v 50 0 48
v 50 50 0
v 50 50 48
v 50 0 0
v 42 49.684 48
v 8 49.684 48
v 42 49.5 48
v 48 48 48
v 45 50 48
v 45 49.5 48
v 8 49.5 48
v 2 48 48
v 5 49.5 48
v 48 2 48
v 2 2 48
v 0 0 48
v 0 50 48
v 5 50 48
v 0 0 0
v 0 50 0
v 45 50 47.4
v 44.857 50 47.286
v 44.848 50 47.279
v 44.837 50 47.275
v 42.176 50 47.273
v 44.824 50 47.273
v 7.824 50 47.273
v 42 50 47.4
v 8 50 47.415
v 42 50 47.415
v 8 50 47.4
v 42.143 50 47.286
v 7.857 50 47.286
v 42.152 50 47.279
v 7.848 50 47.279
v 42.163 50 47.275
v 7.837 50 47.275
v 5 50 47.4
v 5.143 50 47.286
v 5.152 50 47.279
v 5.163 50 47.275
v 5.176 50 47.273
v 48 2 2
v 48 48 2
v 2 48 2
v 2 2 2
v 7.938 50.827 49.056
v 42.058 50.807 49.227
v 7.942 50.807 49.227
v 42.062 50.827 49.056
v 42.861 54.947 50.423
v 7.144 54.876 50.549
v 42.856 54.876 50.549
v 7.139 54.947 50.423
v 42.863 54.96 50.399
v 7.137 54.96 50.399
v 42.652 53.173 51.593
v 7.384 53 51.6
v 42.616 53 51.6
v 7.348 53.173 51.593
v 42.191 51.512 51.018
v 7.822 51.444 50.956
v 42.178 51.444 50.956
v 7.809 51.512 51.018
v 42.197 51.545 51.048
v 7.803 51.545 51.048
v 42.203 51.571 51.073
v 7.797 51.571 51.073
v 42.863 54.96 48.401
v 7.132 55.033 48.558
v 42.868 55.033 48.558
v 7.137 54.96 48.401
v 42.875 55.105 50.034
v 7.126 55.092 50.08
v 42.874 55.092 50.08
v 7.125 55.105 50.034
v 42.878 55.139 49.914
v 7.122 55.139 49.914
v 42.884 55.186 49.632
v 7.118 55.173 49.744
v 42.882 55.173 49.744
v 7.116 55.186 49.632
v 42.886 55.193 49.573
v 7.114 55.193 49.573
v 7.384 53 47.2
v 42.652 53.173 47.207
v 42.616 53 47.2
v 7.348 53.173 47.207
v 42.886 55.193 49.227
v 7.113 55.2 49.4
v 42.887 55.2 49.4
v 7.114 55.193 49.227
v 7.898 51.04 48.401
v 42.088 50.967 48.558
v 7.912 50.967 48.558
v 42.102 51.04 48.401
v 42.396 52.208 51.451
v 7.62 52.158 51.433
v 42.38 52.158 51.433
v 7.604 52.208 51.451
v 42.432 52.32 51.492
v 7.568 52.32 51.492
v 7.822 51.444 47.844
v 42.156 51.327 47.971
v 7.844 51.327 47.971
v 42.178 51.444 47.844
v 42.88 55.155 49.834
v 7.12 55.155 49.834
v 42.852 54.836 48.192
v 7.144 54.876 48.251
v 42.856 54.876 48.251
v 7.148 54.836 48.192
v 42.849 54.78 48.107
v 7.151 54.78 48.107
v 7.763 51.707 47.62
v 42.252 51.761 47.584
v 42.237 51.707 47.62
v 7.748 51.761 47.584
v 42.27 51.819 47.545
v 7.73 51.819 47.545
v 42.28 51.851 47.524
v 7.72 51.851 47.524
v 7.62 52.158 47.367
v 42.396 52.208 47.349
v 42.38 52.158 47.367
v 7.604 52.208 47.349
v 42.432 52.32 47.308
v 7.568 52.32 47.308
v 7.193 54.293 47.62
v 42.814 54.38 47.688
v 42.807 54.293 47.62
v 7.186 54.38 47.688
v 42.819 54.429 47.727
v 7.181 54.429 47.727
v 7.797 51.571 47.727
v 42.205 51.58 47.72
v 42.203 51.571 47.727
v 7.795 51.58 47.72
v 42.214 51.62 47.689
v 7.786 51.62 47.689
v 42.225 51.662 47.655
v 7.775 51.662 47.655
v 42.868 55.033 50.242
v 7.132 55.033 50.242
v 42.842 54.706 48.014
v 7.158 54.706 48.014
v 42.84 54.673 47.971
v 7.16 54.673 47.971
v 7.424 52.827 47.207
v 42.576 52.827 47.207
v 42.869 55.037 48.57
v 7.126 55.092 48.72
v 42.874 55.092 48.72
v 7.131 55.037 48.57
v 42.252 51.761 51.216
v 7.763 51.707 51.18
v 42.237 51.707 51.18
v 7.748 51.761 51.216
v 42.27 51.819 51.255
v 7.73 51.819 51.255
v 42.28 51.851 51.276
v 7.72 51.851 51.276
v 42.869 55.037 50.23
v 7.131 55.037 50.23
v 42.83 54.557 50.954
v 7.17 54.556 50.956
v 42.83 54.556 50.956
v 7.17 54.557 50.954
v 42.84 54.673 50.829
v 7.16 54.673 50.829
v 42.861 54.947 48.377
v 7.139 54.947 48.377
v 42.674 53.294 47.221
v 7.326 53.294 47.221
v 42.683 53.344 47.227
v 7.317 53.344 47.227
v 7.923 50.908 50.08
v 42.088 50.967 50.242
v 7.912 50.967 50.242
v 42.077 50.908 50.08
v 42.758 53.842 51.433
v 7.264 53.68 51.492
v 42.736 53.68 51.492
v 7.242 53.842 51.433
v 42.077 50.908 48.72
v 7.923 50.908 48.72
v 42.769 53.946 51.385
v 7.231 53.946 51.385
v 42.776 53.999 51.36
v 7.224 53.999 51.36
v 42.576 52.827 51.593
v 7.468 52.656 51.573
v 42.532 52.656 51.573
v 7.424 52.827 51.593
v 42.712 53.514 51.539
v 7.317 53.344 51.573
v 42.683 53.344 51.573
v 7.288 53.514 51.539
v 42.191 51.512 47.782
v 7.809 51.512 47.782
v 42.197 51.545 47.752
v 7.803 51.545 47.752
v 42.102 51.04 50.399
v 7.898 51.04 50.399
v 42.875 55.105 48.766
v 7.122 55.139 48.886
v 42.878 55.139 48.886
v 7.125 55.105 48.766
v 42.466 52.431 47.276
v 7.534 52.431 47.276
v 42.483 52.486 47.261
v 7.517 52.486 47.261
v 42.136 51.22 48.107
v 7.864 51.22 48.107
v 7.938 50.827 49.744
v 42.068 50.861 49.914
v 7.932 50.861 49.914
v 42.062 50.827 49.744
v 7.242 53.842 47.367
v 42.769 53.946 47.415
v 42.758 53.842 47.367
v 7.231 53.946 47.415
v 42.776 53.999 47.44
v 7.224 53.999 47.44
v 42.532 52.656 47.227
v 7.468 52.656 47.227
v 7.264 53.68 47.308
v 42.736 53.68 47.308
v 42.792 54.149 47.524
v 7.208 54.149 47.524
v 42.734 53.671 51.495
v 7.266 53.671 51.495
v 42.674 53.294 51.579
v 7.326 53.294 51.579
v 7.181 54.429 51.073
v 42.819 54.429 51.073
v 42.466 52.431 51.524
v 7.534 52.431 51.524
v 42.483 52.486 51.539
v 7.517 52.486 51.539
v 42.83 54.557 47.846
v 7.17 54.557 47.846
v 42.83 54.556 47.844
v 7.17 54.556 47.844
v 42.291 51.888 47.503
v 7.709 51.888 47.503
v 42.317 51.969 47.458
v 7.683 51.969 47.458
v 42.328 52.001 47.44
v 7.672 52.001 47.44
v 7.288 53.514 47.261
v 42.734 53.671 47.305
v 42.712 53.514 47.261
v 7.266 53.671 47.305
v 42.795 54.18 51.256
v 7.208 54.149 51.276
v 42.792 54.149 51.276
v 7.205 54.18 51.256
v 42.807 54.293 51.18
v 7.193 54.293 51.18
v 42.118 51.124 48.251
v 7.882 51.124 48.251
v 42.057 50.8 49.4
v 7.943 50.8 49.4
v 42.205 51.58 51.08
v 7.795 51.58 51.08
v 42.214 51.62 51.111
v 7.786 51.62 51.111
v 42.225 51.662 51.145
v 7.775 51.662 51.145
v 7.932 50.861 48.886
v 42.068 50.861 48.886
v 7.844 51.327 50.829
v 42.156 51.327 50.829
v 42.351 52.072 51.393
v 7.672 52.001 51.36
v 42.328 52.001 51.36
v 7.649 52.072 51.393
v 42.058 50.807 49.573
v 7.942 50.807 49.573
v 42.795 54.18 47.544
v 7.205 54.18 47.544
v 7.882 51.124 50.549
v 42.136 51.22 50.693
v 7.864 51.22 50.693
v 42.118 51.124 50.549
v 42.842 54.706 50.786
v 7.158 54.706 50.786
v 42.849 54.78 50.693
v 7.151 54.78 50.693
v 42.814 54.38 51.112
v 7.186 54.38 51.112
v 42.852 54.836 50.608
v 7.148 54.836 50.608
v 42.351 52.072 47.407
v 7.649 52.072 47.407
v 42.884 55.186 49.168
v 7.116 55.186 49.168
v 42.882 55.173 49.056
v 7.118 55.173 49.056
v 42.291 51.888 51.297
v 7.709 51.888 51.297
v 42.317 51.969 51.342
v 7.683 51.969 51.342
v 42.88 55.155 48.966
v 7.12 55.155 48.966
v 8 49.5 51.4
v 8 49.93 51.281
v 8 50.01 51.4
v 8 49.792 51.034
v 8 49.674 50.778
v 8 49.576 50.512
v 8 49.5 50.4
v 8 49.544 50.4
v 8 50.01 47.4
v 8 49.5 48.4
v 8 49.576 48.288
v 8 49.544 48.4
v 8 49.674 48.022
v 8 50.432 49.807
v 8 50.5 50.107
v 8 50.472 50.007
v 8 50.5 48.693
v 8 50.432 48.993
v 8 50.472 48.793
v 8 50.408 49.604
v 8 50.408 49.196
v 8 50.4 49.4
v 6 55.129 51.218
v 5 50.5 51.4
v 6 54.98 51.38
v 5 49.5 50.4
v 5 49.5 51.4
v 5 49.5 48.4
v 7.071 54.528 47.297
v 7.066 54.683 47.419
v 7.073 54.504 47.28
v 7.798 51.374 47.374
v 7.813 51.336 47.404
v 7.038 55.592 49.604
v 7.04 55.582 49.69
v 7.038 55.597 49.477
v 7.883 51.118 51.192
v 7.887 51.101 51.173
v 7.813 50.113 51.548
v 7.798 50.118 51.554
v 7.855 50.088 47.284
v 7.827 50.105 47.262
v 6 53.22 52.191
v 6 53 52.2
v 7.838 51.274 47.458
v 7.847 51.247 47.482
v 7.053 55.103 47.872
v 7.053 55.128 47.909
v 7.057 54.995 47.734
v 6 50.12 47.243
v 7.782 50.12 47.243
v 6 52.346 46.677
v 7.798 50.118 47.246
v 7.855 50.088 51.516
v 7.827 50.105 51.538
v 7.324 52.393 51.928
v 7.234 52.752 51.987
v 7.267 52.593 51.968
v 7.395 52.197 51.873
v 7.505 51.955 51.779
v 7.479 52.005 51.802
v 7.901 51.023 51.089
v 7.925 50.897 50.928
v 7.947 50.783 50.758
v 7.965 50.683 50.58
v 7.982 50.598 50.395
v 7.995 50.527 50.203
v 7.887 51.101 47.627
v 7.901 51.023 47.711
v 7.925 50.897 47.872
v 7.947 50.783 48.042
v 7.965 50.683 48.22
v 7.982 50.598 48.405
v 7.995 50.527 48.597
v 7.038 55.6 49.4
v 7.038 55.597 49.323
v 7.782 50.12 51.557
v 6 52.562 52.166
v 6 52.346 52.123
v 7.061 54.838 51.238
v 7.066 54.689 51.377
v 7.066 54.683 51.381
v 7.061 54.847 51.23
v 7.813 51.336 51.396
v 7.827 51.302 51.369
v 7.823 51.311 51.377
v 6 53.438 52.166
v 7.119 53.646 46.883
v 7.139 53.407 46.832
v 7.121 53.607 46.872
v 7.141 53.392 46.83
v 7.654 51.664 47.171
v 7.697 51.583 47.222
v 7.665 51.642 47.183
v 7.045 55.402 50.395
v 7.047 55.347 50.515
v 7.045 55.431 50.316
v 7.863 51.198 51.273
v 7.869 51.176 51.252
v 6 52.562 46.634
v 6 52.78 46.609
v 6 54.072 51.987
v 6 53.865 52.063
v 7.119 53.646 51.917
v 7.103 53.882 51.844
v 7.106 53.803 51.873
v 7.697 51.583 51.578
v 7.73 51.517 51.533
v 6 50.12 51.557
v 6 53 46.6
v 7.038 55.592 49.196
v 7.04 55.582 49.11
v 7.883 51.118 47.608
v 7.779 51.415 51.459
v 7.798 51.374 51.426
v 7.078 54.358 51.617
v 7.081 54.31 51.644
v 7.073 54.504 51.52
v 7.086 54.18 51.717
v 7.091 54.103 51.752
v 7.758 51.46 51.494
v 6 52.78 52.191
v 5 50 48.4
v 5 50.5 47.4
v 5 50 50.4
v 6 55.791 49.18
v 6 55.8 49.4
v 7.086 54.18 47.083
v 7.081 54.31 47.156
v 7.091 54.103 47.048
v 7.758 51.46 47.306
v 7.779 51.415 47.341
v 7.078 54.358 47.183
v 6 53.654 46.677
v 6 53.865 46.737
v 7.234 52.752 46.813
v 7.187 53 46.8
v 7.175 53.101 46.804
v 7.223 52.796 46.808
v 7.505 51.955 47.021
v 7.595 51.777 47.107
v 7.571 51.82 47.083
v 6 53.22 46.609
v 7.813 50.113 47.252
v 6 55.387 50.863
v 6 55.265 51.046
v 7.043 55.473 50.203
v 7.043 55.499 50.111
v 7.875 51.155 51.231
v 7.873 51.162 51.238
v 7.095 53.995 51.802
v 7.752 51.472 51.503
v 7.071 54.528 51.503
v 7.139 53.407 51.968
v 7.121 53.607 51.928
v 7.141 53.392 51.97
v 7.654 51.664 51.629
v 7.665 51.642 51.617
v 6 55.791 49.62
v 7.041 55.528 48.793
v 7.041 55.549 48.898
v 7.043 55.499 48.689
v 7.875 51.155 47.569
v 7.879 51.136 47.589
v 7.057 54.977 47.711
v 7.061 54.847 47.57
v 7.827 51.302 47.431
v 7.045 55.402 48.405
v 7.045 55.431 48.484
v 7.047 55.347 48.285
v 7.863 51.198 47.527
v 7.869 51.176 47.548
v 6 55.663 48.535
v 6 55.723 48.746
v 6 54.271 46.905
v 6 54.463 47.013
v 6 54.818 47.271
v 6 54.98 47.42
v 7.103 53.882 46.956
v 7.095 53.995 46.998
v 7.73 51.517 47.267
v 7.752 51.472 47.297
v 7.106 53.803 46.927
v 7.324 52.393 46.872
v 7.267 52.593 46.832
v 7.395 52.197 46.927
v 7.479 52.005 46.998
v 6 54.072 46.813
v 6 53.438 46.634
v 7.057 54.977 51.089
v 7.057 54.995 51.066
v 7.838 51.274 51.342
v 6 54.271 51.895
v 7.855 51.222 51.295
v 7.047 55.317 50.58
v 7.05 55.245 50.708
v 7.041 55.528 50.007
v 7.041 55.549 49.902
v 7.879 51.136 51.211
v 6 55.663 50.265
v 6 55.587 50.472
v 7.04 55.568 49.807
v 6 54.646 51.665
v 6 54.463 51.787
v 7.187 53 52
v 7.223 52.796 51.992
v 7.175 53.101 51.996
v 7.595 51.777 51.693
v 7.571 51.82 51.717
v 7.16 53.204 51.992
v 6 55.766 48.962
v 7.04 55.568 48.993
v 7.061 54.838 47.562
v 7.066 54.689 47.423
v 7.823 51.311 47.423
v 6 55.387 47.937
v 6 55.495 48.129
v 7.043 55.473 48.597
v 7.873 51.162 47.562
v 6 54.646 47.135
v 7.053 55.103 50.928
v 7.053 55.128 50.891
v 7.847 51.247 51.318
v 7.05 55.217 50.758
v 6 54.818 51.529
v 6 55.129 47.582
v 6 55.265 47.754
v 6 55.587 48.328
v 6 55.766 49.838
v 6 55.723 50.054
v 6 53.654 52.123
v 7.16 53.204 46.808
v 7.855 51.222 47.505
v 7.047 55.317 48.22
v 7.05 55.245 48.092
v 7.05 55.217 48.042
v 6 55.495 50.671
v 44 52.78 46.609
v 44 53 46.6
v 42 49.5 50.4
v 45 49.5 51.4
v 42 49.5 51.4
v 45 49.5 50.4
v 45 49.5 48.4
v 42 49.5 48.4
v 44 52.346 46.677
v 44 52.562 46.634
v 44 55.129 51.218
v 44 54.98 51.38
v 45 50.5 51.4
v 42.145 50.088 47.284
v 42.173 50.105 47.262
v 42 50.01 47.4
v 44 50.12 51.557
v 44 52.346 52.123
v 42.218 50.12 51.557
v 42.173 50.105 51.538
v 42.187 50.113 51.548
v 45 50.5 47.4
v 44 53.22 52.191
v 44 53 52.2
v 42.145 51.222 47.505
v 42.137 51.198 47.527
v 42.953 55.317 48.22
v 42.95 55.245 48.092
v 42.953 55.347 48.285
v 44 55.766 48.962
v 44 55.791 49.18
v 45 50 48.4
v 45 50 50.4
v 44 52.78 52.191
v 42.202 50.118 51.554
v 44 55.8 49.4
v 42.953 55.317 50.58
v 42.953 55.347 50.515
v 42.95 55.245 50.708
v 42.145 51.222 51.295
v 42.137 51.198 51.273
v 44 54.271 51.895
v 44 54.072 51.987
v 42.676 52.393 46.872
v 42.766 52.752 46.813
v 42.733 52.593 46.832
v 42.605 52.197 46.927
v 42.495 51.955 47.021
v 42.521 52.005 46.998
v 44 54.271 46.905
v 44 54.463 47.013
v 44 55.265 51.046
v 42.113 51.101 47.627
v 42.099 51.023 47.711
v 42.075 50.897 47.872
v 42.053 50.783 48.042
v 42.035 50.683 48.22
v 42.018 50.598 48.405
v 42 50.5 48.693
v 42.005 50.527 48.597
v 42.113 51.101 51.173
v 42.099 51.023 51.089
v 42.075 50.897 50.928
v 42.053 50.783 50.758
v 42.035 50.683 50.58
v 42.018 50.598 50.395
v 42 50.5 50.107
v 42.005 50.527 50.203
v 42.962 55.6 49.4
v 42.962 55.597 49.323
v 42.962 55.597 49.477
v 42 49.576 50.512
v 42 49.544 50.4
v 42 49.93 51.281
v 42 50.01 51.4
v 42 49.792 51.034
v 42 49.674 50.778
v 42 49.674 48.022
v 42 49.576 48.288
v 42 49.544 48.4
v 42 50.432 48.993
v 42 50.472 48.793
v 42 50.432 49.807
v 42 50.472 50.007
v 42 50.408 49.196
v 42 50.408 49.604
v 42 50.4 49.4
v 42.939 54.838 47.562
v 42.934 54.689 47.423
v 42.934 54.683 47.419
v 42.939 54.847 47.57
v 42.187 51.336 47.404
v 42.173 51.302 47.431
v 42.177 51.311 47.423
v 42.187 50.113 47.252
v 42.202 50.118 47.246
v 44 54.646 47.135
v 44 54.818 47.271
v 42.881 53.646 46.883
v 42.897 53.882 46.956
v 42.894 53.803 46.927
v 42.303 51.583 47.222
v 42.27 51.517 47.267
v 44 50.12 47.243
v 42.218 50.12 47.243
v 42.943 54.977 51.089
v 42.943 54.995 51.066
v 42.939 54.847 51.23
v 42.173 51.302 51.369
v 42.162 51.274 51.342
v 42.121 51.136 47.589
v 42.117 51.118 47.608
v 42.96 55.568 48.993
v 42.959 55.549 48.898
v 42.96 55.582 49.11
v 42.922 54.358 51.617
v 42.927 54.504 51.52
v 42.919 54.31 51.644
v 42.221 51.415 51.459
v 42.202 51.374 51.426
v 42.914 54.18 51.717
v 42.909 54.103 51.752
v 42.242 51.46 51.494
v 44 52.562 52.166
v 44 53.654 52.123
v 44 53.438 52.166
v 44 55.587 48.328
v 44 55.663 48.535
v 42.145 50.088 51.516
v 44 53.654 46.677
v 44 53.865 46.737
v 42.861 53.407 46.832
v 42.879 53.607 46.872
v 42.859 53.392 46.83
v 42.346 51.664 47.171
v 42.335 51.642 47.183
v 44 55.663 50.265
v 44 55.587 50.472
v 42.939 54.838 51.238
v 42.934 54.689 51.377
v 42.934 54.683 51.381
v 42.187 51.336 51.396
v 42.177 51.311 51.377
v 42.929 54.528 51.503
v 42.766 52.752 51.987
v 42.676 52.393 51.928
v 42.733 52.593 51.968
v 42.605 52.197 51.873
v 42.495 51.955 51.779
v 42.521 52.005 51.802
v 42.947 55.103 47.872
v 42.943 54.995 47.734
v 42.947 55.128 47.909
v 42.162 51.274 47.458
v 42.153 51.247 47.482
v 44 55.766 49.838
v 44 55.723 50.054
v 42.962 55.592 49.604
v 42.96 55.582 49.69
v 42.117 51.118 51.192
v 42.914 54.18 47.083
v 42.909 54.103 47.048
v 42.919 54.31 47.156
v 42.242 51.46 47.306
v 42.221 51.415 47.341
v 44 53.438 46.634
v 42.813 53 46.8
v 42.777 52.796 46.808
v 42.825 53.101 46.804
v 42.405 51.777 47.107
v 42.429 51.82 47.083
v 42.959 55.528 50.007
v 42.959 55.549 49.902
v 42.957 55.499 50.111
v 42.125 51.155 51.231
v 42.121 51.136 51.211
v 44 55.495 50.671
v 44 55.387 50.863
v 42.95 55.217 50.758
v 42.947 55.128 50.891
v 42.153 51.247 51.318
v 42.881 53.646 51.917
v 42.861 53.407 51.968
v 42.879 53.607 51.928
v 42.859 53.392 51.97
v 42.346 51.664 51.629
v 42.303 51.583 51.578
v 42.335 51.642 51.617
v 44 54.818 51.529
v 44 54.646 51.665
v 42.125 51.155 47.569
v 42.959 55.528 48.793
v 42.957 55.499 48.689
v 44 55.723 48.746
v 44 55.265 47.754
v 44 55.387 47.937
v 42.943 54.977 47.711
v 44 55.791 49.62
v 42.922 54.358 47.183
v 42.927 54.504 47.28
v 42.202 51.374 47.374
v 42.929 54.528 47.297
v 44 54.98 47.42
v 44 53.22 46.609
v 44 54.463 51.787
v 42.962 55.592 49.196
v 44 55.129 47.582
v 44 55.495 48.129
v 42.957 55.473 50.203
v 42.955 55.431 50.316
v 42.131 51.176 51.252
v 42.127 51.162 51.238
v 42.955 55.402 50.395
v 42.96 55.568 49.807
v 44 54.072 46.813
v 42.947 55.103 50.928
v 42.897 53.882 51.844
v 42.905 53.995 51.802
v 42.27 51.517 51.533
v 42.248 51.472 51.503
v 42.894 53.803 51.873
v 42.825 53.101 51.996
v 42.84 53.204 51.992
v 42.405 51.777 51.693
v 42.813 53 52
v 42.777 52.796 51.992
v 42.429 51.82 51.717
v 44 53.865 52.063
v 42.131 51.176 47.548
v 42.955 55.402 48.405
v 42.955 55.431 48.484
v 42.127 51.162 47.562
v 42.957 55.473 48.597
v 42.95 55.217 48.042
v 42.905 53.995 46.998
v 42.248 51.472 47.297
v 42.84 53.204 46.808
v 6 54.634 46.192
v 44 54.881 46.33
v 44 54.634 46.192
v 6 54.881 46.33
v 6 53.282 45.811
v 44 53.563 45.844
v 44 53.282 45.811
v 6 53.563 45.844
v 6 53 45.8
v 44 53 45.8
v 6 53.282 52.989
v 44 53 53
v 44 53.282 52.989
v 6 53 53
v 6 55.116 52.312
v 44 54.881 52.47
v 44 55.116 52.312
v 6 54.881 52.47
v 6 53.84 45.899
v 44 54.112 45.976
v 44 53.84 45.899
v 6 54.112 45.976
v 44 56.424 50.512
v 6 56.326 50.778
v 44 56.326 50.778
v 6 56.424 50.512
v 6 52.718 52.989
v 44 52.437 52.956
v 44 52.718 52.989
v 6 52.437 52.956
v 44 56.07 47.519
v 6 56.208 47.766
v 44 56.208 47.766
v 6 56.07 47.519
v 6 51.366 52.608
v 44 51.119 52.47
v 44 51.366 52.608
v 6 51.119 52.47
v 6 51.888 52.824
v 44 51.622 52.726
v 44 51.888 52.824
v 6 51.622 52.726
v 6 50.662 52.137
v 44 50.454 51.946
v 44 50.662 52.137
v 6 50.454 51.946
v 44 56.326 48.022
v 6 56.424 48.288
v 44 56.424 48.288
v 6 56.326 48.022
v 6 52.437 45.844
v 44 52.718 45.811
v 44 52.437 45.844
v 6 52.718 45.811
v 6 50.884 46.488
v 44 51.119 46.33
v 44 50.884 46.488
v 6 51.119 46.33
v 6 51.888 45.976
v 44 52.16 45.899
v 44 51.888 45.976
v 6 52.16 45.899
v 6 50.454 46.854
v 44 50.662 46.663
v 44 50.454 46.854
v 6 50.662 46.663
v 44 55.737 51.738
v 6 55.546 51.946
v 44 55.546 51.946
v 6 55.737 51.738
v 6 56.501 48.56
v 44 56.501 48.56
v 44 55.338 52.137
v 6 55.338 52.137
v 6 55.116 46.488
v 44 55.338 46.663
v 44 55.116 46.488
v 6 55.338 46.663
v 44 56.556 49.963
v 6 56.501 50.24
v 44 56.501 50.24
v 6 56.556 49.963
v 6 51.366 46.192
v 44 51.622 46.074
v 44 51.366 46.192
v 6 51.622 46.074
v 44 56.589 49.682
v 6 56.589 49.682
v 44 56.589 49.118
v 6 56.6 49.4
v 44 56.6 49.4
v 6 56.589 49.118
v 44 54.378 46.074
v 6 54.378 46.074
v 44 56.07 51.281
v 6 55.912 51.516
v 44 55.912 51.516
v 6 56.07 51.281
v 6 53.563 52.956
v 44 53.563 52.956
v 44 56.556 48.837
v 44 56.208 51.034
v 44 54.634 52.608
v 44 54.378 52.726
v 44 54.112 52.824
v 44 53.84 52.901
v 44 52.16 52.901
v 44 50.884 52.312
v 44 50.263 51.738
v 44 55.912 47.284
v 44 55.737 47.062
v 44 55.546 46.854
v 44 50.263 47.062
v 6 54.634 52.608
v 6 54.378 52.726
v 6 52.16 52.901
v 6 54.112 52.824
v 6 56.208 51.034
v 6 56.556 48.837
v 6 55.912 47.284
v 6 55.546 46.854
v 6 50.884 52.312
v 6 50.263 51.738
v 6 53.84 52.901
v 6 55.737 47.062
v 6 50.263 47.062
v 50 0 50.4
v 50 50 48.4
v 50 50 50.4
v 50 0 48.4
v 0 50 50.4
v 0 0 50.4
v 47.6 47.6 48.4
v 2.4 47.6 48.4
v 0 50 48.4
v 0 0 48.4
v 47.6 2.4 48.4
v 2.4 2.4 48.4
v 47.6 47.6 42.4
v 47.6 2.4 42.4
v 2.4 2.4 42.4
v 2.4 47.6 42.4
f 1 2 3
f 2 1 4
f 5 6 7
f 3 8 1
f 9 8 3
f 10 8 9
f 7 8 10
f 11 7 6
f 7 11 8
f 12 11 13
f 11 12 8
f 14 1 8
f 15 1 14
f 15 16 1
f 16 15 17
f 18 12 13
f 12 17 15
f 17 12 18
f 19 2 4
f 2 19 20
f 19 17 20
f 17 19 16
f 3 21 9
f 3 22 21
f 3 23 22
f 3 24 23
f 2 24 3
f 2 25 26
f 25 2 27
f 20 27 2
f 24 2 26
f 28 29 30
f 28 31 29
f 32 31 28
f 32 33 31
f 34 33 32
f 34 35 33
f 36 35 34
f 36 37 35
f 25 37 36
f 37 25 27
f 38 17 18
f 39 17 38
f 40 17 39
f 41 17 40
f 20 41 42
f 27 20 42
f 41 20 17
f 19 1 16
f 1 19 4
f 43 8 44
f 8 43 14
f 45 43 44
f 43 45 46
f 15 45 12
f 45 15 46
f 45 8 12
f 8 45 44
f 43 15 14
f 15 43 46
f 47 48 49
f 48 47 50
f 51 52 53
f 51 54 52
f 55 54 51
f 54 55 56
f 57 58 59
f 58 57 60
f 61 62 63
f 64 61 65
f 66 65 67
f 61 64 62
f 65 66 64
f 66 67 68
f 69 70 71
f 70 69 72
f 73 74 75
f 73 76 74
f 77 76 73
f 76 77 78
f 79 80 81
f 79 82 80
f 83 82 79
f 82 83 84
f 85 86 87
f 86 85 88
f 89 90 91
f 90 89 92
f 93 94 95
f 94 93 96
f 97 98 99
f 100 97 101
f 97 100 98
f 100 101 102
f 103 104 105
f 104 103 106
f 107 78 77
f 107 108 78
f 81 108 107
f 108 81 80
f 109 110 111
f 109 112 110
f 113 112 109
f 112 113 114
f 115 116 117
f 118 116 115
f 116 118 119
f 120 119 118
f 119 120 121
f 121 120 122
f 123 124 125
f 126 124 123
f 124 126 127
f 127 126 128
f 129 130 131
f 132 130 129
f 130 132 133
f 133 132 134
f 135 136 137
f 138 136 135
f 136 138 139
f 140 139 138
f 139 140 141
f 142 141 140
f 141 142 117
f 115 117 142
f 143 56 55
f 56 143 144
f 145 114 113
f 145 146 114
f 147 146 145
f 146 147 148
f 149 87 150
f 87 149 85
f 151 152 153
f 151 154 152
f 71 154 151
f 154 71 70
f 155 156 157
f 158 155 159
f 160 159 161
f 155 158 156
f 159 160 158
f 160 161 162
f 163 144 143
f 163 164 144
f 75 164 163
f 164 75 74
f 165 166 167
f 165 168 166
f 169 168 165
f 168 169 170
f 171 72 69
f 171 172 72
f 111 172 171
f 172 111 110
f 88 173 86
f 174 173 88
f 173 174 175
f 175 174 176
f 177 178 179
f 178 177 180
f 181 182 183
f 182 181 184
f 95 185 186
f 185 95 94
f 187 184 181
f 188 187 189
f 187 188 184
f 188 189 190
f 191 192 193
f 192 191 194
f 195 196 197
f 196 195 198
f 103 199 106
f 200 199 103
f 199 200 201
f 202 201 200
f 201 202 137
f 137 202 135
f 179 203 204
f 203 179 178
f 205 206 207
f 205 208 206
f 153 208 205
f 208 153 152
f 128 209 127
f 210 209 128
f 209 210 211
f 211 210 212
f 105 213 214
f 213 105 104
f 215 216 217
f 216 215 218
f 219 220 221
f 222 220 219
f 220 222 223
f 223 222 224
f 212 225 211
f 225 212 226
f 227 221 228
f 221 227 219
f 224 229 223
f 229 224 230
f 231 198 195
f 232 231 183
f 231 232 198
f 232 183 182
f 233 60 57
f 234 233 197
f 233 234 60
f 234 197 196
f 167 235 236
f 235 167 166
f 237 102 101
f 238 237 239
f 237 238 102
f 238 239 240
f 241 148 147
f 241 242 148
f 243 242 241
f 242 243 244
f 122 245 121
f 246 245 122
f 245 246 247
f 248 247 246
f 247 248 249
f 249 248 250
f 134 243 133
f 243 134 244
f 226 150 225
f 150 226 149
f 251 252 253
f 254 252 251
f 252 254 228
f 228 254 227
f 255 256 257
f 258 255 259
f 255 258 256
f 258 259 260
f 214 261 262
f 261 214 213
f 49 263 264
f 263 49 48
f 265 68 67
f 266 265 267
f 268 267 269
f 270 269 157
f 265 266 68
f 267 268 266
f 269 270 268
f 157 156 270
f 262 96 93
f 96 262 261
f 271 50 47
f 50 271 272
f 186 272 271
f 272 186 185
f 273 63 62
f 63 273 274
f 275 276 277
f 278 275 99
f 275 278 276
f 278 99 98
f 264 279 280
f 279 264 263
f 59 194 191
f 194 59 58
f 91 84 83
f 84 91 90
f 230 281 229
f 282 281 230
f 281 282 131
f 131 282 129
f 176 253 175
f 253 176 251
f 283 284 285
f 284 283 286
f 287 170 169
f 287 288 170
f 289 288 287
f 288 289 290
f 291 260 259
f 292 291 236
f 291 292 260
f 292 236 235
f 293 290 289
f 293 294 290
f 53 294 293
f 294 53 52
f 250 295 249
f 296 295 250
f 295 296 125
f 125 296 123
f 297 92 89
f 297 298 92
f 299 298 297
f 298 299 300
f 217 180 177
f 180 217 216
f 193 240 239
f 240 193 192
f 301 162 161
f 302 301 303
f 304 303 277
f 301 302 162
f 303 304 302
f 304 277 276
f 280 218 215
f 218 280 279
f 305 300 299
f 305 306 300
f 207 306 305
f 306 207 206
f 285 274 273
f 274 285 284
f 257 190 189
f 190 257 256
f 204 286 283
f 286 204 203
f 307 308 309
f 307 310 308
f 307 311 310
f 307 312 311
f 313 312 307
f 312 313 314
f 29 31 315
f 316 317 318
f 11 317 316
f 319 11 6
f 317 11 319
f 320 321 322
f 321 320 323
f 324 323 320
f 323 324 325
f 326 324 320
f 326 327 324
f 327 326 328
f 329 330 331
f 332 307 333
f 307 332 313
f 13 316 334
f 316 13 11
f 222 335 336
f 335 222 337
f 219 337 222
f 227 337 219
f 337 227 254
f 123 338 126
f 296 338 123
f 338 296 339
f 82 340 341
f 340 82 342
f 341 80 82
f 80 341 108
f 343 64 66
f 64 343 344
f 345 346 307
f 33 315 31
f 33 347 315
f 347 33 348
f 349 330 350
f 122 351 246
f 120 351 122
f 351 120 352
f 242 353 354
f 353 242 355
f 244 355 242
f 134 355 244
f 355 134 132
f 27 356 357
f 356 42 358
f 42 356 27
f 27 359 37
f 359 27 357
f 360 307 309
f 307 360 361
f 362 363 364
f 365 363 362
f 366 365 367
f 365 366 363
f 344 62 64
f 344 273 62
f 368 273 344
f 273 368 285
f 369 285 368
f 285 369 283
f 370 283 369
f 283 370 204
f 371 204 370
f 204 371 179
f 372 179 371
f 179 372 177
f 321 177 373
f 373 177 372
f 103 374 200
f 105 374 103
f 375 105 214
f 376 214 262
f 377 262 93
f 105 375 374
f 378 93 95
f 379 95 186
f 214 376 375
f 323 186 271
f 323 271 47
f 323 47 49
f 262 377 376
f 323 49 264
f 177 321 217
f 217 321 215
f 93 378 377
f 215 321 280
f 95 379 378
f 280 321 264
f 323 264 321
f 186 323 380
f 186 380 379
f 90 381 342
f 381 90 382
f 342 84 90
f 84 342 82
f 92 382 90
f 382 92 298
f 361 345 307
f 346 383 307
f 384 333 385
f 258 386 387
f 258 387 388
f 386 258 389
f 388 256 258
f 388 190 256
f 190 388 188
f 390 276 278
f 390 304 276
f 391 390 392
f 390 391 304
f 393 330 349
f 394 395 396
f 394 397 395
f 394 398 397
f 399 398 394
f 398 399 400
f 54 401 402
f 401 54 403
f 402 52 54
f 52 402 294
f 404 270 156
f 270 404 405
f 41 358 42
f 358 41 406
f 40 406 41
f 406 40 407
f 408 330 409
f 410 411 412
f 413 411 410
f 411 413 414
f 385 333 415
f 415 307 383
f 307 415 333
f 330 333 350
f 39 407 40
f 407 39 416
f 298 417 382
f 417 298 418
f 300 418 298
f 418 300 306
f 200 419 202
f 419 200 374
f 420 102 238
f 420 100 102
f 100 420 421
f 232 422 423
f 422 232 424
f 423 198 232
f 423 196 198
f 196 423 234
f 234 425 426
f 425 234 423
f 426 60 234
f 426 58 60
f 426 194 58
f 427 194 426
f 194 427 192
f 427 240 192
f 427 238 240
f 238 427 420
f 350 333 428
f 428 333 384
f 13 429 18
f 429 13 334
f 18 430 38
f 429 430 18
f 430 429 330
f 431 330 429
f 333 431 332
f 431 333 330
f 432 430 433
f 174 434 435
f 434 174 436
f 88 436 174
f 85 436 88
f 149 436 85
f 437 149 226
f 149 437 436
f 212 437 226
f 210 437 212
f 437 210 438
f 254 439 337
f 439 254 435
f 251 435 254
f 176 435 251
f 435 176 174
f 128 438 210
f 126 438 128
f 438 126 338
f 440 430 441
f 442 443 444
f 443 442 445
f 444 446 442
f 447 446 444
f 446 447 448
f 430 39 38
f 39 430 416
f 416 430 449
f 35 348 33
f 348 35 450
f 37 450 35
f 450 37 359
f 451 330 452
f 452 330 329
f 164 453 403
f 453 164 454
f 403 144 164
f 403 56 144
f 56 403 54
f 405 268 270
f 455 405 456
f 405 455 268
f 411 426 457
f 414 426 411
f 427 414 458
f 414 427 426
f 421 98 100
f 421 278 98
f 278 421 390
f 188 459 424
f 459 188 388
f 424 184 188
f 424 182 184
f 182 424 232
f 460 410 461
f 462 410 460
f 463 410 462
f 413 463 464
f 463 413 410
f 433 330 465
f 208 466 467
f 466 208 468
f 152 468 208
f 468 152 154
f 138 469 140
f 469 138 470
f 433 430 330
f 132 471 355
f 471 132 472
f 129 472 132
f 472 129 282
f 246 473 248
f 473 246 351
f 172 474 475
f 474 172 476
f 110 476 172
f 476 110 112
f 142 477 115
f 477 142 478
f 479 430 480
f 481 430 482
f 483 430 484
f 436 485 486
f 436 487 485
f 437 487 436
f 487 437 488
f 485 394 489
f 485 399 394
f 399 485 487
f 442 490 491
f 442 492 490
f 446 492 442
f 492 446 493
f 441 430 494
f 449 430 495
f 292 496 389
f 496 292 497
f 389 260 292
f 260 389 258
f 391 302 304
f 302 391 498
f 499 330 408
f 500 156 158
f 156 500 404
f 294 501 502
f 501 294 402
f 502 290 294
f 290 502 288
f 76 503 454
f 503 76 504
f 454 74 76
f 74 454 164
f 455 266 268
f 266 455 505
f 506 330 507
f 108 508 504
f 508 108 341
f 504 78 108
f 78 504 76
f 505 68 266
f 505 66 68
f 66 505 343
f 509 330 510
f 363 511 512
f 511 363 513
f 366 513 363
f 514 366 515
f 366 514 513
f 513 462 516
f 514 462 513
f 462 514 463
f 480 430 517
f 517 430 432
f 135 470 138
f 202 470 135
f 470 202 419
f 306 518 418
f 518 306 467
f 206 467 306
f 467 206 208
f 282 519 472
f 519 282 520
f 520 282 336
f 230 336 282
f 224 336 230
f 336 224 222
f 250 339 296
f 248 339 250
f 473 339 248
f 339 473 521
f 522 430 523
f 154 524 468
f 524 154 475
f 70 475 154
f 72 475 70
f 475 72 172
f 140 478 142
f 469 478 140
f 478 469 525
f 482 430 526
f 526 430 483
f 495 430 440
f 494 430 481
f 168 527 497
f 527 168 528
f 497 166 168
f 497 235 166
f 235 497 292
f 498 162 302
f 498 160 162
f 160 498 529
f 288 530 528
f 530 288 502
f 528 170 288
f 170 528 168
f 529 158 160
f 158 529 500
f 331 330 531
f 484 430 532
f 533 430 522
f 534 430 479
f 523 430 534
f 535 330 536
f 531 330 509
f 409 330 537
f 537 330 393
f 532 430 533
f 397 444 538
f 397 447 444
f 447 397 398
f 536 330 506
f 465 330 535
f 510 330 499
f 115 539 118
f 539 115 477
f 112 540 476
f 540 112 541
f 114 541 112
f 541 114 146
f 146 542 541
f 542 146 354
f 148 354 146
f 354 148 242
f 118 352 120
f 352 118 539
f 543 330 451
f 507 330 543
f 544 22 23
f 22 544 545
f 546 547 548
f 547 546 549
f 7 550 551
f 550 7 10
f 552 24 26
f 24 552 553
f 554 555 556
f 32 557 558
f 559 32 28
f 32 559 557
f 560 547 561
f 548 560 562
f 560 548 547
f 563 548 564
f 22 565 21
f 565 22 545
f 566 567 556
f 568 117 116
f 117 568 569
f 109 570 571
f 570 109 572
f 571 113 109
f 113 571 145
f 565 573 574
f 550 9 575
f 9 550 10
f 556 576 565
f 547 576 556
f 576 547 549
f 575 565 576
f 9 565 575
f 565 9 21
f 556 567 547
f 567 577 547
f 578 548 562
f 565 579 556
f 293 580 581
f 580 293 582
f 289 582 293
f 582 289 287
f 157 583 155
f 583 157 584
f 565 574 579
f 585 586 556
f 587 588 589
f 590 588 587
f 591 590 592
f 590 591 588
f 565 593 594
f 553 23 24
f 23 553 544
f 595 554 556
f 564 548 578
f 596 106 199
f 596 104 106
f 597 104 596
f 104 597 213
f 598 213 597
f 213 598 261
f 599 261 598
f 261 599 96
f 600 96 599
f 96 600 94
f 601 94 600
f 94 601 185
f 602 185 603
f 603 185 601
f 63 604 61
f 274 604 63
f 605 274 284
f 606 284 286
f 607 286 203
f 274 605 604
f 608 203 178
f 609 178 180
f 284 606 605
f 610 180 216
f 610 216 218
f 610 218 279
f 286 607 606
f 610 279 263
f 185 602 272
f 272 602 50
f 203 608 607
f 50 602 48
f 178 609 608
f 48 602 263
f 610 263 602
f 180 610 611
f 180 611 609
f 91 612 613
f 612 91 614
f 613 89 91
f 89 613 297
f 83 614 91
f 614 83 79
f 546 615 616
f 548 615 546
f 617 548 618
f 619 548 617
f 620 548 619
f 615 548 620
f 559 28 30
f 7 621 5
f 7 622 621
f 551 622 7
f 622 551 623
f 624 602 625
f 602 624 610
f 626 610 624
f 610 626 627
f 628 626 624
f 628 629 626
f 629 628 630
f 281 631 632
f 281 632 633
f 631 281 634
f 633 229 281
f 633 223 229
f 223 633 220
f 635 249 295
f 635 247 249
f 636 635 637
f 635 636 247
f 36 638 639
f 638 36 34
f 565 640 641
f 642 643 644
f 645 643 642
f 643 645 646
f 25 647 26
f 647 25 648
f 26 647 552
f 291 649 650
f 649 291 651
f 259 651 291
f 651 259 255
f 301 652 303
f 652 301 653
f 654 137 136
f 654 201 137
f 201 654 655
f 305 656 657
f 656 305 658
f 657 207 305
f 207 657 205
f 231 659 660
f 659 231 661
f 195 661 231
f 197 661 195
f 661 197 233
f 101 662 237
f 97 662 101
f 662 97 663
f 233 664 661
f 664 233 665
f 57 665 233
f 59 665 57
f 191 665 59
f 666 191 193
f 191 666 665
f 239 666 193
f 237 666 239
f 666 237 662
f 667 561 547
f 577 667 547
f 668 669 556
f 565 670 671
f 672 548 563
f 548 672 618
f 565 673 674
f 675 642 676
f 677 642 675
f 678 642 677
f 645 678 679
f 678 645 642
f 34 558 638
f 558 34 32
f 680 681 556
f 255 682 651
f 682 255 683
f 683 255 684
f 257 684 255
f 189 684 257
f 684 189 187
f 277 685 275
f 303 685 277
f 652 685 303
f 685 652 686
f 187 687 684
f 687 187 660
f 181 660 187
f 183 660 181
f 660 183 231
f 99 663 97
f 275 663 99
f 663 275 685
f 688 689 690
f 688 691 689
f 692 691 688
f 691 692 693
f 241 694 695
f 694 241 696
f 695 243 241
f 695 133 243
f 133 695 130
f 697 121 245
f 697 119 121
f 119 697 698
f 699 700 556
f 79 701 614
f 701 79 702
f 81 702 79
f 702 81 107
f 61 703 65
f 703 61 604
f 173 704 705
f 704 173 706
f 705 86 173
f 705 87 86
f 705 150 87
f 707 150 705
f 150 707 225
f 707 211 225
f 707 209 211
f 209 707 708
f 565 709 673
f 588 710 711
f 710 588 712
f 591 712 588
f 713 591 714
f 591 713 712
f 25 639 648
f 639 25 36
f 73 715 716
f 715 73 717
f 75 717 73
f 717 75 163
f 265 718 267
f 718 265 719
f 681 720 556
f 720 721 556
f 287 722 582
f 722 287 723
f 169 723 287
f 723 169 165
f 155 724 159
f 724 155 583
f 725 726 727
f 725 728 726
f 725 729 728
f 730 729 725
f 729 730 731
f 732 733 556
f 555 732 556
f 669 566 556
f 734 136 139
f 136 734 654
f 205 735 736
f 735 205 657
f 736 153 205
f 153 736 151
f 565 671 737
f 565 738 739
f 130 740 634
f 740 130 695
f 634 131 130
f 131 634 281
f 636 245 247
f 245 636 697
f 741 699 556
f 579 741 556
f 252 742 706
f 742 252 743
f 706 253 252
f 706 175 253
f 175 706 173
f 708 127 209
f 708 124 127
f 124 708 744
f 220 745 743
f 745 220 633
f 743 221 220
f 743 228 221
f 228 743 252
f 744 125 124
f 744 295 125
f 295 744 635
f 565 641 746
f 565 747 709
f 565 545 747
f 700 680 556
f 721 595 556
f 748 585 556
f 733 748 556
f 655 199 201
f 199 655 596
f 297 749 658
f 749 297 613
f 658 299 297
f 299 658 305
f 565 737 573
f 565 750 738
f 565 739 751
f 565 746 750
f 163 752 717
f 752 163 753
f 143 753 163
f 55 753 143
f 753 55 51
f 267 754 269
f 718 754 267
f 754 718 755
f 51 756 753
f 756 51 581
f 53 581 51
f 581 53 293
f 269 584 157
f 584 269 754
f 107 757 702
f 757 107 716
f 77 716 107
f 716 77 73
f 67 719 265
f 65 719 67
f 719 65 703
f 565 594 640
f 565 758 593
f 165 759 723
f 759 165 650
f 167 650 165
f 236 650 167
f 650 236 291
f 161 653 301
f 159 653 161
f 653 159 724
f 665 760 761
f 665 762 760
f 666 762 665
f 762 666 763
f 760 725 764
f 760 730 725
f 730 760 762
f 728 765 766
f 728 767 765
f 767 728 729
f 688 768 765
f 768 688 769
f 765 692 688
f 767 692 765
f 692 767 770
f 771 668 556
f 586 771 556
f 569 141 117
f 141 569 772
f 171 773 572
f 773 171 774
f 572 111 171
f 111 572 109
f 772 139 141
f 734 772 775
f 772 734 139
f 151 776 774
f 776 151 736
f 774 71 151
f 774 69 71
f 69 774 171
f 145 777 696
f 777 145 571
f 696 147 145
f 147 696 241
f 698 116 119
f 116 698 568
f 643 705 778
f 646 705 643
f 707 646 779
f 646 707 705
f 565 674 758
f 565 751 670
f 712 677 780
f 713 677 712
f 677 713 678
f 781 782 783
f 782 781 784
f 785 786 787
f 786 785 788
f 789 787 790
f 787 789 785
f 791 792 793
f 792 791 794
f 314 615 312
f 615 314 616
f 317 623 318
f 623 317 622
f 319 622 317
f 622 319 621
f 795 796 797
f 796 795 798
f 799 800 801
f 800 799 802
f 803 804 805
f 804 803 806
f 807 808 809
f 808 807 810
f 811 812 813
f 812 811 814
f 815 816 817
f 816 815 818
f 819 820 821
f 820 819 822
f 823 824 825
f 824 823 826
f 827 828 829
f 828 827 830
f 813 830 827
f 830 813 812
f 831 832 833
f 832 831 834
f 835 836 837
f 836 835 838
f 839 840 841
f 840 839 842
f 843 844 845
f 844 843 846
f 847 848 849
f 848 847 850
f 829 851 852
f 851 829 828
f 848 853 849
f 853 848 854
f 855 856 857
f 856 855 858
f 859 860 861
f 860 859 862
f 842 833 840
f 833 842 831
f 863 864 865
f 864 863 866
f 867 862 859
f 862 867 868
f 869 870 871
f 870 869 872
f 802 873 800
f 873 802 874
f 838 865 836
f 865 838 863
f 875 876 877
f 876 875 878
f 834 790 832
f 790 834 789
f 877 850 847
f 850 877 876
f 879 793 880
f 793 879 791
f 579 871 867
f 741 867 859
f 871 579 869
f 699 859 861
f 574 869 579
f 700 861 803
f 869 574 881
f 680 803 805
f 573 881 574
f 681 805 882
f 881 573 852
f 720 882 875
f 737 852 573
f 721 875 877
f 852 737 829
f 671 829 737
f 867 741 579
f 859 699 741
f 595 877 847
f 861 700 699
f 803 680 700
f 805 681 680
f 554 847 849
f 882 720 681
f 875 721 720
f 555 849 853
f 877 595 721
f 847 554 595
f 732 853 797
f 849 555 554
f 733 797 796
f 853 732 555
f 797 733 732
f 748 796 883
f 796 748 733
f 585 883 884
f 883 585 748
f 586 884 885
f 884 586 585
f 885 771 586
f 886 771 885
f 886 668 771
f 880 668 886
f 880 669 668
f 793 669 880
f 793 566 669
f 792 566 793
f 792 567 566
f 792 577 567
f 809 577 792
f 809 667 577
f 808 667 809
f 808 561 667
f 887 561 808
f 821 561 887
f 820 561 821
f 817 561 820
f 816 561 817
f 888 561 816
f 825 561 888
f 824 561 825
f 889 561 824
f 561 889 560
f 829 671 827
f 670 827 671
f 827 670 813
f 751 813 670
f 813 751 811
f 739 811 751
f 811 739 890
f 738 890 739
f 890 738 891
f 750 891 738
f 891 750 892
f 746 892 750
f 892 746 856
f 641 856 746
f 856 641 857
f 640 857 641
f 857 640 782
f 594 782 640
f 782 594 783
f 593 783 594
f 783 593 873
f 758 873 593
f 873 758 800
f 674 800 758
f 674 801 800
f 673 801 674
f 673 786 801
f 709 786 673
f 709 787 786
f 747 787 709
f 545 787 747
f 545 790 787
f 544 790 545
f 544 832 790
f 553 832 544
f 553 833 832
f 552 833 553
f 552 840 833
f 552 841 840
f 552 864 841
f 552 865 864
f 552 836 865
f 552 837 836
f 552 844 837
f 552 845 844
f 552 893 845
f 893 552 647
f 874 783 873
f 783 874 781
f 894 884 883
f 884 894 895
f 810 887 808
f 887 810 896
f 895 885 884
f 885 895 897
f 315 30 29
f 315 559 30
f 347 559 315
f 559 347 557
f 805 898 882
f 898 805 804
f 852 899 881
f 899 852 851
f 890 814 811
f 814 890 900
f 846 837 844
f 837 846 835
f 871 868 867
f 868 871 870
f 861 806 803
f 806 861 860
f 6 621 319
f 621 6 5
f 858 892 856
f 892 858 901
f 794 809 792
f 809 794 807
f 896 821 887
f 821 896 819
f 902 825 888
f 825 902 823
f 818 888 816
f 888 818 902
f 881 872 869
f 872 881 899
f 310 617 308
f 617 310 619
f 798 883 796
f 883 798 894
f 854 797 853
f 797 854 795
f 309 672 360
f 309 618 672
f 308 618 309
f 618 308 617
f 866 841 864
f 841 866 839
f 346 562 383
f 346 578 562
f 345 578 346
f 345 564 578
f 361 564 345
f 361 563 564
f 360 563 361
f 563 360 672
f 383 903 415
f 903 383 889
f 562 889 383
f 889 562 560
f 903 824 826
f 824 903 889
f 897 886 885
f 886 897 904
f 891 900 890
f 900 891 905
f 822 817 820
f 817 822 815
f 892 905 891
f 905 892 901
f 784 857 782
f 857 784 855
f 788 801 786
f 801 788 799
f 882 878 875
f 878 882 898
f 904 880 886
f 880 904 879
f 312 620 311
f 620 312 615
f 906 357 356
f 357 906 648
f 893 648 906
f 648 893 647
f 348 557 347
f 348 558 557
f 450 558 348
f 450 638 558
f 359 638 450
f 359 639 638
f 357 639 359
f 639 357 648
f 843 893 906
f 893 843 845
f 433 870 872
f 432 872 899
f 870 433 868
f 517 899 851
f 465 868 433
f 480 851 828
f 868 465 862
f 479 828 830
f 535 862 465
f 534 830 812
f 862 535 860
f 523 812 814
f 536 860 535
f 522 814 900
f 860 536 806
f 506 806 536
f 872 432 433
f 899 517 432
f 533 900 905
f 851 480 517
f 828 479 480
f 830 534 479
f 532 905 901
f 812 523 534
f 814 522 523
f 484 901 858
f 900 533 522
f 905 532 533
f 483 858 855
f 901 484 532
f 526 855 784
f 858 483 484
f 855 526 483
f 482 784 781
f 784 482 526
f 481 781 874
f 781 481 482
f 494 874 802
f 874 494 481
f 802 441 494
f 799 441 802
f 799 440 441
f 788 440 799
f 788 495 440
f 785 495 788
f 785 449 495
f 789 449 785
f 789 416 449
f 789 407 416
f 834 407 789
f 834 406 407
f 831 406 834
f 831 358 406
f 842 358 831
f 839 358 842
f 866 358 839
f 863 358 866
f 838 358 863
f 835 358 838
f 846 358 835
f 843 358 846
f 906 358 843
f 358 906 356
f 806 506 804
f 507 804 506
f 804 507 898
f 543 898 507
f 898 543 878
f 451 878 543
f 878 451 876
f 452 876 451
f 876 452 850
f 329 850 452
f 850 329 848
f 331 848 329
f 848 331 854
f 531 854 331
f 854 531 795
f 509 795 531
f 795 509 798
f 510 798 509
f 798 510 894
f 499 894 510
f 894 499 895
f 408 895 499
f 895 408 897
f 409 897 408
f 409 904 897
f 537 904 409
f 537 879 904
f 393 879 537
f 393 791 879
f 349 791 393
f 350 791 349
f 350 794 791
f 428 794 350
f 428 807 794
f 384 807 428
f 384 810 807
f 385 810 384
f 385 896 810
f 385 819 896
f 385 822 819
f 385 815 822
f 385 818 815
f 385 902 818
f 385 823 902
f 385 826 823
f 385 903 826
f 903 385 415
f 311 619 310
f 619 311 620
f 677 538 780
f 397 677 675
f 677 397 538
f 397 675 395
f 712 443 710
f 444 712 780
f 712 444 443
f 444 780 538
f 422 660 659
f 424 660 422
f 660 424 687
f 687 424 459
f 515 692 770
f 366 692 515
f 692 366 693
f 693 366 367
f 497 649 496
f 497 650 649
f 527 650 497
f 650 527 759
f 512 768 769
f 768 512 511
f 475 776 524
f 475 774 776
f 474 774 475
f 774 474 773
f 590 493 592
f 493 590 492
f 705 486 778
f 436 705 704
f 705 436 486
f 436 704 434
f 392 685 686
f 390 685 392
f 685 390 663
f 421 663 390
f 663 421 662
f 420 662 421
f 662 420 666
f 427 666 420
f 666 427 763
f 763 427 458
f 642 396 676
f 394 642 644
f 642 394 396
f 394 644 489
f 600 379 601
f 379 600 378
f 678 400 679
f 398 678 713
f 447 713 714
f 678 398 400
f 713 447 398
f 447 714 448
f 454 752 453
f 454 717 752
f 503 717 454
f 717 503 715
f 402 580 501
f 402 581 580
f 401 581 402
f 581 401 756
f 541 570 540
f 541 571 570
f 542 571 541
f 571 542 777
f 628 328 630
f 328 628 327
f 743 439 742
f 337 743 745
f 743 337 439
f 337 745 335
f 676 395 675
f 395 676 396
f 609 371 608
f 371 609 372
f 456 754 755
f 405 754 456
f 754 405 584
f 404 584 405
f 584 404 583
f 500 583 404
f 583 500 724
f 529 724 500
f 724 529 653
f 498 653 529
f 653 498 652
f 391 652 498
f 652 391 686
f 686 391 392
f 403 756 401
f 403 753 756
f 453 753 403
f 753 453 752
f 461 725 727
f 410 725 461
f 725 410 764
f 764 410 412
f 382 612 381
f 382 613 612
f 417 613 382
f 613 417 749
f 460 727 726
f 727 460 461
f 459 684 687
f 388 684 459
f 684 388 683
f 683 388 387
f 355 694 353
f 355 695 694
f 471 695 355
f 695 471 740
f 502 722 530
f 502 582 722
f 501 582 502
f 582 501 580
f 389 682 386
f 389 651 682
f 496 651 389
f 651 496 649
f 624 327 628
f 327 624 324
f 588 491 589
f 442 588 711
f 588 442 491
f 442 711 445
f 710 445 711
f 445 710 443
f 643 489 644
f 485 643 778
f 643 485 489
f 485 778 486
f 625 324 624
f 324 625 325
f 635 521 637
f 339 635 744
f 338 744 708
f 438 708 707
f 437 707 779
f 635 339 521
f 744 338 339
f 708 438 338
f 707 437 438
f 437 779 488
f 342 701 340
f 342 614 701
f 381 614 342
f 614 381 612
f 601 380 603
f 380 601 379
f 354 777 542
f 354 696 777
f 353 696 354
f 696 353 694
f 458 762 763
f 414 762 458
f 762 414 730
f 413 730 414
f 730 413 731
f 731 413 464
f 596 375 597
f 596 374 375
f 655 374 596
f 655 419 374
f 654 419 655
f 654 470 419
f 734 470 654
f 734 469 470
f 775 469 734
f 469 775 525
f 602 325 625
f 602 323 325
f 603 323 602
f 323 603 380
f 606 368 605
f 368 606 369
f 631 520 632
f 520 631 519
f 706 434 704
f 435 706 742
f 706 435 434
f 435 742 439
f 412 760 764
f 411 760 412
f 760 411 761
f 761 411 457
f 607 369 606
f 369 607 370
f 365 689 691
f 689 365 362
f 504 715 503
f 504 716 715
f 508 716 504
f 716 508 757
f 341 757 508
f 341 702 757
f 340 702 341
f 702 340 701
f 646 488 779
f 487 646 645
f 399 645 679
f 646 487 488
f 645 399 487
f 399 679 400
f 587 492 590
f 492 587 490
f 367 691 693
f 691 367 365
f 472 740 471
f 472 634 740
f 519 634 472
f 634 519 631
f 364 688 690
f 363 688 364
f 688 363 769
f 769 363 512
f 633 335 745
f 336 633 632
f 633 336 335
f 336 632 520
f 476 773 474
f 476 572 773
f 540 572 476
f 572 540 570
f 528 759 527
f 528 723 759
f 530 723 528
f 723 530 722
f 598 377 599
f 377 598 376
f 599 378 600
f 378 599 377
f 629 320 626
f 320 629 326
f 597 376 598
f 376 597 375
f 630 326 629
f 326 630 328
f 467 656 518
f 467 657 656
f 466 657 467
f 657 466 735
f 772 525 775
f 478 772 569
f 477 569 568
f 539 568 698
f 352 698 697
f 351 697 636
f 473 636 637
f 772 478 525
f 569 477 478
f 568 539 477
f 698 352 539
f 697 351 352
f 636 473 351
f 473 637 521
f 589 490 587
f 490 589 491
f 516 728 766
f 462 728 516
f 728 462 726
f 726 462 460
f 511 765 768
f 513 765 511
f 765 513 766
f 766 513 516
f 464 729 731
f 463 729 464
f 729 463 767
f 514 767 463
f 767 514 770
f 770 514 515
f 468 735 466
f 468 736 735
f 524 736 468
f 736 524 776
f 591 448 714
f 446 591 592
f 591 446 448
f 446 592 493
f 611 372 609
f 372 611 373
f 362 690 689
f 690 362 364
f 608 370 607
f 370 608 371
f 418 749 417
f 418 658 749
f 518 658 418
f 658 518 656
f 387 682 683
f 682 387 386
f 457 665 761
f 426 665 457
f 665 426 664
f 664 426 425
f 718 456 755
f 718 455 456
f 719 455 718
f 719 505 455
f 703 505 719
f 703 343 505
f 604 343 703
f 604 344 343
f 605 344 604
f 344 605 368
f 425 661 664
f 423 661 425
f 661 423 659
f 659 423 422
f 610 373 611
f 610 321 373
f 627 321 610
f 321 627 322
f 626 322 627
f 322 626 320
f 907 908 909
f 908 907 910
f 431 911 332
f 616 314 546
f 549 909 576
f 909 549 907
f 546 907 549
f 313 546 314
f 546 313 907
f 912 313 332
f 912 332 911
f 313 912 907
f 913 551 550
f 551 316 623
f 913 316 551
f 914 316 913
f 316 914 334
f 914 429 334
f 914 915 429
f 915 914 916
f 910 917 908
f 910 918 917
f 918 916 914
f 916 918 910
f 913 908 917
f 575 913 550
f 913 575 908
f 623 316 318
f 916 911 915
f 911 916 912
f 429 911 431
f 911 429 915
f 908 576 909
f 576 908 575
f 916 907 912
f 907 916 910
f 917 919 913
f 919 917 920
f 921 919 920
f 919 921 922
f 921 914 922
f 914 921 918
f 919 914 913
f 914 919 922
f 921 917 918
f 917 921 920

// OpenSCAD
// Print-in-place hinged box (5 cm cube) with simple hinge.
// Export as STL directly; lid and base are already assembled with clearance.

outer = 50;
wall = 2;
lid_thickness = 2;
clearance = 0.4;
skirt_depth = 6;

pin_radius = 2.2;
barrel_radius = 3.6;
hinge_overlap = 0.6;
hinge_end_gap = 6;

$fn = 80;

base_height = outer - lid_thickness;
lid_z = base_height + clearance;
hinge_axis_y = outer + barrel_radius - hinge_overlap;
hinge_axis_z = lid_z + lid_thickness / 2;
hinge_length = outer - 2 * hinge_end_gap;

module base_shell() {
  difference() {
    cube([outer, outer, base_height], center = false);
    translate([wall, wall, wall])
      cube([outer - 2 * wall, outer - 2 * wall, base_height - wall], center = false);
  }
}

module hinge_pin() {
  translate([hinge_end_gap, hinge_axis_y, hinge_axis_z])
    rotate([0, 90, 0])
      cylinder(h = hinge_length, r = pin_radius, center = false);
}

module hinge_bracket(x_pos) {
  hull() {
    translate([x_pos, outer - 0.5, hinge_axis_z - 2])
      cube([3, 1, 4], center = false);
    translate([x_pos + 1.5, hinge_axis_y, hinge_axis_z])
      rotate([0, 90, 0])
        cylinder(h = 1, r = pin_radius + 0.6, center = true);
  }
}

module base() {
  union() {
    base_shell();
    hinge_pin();
    hinge_bracket(hinge_end_gap - 1);
    hinge_bracket(hinge_end_gap + hinge_length - 2);
  }
}

module lid_barrel() {
  translate([hinge_end_gap, hinge_axis_y, hinge_axis_z])
    rotate([0, 90, 0])
      difference() {
        cylinder(h = hinge_length, r = barrel_radius, center = false);
        translate([0, 0, -0.1])
          cylinder(h = hinge_length + 0.2, r = pin_radius + clearance, center = false);
      }
}

module lid() {
  union() {
    translate([0, 0, lid_z])
      cube([outer, outer, lid_thickness], center = false);
    translate([wall + clearance, wall + clearance, lid_z - skirt_depth])
      cube([outer - 2 * (wall + clearance),
            outer - 2 * (wall + clearance),
            skirt_depth], center = false);
    lid_barrel();
  }
}

union() {
  base();
  lid();
}
